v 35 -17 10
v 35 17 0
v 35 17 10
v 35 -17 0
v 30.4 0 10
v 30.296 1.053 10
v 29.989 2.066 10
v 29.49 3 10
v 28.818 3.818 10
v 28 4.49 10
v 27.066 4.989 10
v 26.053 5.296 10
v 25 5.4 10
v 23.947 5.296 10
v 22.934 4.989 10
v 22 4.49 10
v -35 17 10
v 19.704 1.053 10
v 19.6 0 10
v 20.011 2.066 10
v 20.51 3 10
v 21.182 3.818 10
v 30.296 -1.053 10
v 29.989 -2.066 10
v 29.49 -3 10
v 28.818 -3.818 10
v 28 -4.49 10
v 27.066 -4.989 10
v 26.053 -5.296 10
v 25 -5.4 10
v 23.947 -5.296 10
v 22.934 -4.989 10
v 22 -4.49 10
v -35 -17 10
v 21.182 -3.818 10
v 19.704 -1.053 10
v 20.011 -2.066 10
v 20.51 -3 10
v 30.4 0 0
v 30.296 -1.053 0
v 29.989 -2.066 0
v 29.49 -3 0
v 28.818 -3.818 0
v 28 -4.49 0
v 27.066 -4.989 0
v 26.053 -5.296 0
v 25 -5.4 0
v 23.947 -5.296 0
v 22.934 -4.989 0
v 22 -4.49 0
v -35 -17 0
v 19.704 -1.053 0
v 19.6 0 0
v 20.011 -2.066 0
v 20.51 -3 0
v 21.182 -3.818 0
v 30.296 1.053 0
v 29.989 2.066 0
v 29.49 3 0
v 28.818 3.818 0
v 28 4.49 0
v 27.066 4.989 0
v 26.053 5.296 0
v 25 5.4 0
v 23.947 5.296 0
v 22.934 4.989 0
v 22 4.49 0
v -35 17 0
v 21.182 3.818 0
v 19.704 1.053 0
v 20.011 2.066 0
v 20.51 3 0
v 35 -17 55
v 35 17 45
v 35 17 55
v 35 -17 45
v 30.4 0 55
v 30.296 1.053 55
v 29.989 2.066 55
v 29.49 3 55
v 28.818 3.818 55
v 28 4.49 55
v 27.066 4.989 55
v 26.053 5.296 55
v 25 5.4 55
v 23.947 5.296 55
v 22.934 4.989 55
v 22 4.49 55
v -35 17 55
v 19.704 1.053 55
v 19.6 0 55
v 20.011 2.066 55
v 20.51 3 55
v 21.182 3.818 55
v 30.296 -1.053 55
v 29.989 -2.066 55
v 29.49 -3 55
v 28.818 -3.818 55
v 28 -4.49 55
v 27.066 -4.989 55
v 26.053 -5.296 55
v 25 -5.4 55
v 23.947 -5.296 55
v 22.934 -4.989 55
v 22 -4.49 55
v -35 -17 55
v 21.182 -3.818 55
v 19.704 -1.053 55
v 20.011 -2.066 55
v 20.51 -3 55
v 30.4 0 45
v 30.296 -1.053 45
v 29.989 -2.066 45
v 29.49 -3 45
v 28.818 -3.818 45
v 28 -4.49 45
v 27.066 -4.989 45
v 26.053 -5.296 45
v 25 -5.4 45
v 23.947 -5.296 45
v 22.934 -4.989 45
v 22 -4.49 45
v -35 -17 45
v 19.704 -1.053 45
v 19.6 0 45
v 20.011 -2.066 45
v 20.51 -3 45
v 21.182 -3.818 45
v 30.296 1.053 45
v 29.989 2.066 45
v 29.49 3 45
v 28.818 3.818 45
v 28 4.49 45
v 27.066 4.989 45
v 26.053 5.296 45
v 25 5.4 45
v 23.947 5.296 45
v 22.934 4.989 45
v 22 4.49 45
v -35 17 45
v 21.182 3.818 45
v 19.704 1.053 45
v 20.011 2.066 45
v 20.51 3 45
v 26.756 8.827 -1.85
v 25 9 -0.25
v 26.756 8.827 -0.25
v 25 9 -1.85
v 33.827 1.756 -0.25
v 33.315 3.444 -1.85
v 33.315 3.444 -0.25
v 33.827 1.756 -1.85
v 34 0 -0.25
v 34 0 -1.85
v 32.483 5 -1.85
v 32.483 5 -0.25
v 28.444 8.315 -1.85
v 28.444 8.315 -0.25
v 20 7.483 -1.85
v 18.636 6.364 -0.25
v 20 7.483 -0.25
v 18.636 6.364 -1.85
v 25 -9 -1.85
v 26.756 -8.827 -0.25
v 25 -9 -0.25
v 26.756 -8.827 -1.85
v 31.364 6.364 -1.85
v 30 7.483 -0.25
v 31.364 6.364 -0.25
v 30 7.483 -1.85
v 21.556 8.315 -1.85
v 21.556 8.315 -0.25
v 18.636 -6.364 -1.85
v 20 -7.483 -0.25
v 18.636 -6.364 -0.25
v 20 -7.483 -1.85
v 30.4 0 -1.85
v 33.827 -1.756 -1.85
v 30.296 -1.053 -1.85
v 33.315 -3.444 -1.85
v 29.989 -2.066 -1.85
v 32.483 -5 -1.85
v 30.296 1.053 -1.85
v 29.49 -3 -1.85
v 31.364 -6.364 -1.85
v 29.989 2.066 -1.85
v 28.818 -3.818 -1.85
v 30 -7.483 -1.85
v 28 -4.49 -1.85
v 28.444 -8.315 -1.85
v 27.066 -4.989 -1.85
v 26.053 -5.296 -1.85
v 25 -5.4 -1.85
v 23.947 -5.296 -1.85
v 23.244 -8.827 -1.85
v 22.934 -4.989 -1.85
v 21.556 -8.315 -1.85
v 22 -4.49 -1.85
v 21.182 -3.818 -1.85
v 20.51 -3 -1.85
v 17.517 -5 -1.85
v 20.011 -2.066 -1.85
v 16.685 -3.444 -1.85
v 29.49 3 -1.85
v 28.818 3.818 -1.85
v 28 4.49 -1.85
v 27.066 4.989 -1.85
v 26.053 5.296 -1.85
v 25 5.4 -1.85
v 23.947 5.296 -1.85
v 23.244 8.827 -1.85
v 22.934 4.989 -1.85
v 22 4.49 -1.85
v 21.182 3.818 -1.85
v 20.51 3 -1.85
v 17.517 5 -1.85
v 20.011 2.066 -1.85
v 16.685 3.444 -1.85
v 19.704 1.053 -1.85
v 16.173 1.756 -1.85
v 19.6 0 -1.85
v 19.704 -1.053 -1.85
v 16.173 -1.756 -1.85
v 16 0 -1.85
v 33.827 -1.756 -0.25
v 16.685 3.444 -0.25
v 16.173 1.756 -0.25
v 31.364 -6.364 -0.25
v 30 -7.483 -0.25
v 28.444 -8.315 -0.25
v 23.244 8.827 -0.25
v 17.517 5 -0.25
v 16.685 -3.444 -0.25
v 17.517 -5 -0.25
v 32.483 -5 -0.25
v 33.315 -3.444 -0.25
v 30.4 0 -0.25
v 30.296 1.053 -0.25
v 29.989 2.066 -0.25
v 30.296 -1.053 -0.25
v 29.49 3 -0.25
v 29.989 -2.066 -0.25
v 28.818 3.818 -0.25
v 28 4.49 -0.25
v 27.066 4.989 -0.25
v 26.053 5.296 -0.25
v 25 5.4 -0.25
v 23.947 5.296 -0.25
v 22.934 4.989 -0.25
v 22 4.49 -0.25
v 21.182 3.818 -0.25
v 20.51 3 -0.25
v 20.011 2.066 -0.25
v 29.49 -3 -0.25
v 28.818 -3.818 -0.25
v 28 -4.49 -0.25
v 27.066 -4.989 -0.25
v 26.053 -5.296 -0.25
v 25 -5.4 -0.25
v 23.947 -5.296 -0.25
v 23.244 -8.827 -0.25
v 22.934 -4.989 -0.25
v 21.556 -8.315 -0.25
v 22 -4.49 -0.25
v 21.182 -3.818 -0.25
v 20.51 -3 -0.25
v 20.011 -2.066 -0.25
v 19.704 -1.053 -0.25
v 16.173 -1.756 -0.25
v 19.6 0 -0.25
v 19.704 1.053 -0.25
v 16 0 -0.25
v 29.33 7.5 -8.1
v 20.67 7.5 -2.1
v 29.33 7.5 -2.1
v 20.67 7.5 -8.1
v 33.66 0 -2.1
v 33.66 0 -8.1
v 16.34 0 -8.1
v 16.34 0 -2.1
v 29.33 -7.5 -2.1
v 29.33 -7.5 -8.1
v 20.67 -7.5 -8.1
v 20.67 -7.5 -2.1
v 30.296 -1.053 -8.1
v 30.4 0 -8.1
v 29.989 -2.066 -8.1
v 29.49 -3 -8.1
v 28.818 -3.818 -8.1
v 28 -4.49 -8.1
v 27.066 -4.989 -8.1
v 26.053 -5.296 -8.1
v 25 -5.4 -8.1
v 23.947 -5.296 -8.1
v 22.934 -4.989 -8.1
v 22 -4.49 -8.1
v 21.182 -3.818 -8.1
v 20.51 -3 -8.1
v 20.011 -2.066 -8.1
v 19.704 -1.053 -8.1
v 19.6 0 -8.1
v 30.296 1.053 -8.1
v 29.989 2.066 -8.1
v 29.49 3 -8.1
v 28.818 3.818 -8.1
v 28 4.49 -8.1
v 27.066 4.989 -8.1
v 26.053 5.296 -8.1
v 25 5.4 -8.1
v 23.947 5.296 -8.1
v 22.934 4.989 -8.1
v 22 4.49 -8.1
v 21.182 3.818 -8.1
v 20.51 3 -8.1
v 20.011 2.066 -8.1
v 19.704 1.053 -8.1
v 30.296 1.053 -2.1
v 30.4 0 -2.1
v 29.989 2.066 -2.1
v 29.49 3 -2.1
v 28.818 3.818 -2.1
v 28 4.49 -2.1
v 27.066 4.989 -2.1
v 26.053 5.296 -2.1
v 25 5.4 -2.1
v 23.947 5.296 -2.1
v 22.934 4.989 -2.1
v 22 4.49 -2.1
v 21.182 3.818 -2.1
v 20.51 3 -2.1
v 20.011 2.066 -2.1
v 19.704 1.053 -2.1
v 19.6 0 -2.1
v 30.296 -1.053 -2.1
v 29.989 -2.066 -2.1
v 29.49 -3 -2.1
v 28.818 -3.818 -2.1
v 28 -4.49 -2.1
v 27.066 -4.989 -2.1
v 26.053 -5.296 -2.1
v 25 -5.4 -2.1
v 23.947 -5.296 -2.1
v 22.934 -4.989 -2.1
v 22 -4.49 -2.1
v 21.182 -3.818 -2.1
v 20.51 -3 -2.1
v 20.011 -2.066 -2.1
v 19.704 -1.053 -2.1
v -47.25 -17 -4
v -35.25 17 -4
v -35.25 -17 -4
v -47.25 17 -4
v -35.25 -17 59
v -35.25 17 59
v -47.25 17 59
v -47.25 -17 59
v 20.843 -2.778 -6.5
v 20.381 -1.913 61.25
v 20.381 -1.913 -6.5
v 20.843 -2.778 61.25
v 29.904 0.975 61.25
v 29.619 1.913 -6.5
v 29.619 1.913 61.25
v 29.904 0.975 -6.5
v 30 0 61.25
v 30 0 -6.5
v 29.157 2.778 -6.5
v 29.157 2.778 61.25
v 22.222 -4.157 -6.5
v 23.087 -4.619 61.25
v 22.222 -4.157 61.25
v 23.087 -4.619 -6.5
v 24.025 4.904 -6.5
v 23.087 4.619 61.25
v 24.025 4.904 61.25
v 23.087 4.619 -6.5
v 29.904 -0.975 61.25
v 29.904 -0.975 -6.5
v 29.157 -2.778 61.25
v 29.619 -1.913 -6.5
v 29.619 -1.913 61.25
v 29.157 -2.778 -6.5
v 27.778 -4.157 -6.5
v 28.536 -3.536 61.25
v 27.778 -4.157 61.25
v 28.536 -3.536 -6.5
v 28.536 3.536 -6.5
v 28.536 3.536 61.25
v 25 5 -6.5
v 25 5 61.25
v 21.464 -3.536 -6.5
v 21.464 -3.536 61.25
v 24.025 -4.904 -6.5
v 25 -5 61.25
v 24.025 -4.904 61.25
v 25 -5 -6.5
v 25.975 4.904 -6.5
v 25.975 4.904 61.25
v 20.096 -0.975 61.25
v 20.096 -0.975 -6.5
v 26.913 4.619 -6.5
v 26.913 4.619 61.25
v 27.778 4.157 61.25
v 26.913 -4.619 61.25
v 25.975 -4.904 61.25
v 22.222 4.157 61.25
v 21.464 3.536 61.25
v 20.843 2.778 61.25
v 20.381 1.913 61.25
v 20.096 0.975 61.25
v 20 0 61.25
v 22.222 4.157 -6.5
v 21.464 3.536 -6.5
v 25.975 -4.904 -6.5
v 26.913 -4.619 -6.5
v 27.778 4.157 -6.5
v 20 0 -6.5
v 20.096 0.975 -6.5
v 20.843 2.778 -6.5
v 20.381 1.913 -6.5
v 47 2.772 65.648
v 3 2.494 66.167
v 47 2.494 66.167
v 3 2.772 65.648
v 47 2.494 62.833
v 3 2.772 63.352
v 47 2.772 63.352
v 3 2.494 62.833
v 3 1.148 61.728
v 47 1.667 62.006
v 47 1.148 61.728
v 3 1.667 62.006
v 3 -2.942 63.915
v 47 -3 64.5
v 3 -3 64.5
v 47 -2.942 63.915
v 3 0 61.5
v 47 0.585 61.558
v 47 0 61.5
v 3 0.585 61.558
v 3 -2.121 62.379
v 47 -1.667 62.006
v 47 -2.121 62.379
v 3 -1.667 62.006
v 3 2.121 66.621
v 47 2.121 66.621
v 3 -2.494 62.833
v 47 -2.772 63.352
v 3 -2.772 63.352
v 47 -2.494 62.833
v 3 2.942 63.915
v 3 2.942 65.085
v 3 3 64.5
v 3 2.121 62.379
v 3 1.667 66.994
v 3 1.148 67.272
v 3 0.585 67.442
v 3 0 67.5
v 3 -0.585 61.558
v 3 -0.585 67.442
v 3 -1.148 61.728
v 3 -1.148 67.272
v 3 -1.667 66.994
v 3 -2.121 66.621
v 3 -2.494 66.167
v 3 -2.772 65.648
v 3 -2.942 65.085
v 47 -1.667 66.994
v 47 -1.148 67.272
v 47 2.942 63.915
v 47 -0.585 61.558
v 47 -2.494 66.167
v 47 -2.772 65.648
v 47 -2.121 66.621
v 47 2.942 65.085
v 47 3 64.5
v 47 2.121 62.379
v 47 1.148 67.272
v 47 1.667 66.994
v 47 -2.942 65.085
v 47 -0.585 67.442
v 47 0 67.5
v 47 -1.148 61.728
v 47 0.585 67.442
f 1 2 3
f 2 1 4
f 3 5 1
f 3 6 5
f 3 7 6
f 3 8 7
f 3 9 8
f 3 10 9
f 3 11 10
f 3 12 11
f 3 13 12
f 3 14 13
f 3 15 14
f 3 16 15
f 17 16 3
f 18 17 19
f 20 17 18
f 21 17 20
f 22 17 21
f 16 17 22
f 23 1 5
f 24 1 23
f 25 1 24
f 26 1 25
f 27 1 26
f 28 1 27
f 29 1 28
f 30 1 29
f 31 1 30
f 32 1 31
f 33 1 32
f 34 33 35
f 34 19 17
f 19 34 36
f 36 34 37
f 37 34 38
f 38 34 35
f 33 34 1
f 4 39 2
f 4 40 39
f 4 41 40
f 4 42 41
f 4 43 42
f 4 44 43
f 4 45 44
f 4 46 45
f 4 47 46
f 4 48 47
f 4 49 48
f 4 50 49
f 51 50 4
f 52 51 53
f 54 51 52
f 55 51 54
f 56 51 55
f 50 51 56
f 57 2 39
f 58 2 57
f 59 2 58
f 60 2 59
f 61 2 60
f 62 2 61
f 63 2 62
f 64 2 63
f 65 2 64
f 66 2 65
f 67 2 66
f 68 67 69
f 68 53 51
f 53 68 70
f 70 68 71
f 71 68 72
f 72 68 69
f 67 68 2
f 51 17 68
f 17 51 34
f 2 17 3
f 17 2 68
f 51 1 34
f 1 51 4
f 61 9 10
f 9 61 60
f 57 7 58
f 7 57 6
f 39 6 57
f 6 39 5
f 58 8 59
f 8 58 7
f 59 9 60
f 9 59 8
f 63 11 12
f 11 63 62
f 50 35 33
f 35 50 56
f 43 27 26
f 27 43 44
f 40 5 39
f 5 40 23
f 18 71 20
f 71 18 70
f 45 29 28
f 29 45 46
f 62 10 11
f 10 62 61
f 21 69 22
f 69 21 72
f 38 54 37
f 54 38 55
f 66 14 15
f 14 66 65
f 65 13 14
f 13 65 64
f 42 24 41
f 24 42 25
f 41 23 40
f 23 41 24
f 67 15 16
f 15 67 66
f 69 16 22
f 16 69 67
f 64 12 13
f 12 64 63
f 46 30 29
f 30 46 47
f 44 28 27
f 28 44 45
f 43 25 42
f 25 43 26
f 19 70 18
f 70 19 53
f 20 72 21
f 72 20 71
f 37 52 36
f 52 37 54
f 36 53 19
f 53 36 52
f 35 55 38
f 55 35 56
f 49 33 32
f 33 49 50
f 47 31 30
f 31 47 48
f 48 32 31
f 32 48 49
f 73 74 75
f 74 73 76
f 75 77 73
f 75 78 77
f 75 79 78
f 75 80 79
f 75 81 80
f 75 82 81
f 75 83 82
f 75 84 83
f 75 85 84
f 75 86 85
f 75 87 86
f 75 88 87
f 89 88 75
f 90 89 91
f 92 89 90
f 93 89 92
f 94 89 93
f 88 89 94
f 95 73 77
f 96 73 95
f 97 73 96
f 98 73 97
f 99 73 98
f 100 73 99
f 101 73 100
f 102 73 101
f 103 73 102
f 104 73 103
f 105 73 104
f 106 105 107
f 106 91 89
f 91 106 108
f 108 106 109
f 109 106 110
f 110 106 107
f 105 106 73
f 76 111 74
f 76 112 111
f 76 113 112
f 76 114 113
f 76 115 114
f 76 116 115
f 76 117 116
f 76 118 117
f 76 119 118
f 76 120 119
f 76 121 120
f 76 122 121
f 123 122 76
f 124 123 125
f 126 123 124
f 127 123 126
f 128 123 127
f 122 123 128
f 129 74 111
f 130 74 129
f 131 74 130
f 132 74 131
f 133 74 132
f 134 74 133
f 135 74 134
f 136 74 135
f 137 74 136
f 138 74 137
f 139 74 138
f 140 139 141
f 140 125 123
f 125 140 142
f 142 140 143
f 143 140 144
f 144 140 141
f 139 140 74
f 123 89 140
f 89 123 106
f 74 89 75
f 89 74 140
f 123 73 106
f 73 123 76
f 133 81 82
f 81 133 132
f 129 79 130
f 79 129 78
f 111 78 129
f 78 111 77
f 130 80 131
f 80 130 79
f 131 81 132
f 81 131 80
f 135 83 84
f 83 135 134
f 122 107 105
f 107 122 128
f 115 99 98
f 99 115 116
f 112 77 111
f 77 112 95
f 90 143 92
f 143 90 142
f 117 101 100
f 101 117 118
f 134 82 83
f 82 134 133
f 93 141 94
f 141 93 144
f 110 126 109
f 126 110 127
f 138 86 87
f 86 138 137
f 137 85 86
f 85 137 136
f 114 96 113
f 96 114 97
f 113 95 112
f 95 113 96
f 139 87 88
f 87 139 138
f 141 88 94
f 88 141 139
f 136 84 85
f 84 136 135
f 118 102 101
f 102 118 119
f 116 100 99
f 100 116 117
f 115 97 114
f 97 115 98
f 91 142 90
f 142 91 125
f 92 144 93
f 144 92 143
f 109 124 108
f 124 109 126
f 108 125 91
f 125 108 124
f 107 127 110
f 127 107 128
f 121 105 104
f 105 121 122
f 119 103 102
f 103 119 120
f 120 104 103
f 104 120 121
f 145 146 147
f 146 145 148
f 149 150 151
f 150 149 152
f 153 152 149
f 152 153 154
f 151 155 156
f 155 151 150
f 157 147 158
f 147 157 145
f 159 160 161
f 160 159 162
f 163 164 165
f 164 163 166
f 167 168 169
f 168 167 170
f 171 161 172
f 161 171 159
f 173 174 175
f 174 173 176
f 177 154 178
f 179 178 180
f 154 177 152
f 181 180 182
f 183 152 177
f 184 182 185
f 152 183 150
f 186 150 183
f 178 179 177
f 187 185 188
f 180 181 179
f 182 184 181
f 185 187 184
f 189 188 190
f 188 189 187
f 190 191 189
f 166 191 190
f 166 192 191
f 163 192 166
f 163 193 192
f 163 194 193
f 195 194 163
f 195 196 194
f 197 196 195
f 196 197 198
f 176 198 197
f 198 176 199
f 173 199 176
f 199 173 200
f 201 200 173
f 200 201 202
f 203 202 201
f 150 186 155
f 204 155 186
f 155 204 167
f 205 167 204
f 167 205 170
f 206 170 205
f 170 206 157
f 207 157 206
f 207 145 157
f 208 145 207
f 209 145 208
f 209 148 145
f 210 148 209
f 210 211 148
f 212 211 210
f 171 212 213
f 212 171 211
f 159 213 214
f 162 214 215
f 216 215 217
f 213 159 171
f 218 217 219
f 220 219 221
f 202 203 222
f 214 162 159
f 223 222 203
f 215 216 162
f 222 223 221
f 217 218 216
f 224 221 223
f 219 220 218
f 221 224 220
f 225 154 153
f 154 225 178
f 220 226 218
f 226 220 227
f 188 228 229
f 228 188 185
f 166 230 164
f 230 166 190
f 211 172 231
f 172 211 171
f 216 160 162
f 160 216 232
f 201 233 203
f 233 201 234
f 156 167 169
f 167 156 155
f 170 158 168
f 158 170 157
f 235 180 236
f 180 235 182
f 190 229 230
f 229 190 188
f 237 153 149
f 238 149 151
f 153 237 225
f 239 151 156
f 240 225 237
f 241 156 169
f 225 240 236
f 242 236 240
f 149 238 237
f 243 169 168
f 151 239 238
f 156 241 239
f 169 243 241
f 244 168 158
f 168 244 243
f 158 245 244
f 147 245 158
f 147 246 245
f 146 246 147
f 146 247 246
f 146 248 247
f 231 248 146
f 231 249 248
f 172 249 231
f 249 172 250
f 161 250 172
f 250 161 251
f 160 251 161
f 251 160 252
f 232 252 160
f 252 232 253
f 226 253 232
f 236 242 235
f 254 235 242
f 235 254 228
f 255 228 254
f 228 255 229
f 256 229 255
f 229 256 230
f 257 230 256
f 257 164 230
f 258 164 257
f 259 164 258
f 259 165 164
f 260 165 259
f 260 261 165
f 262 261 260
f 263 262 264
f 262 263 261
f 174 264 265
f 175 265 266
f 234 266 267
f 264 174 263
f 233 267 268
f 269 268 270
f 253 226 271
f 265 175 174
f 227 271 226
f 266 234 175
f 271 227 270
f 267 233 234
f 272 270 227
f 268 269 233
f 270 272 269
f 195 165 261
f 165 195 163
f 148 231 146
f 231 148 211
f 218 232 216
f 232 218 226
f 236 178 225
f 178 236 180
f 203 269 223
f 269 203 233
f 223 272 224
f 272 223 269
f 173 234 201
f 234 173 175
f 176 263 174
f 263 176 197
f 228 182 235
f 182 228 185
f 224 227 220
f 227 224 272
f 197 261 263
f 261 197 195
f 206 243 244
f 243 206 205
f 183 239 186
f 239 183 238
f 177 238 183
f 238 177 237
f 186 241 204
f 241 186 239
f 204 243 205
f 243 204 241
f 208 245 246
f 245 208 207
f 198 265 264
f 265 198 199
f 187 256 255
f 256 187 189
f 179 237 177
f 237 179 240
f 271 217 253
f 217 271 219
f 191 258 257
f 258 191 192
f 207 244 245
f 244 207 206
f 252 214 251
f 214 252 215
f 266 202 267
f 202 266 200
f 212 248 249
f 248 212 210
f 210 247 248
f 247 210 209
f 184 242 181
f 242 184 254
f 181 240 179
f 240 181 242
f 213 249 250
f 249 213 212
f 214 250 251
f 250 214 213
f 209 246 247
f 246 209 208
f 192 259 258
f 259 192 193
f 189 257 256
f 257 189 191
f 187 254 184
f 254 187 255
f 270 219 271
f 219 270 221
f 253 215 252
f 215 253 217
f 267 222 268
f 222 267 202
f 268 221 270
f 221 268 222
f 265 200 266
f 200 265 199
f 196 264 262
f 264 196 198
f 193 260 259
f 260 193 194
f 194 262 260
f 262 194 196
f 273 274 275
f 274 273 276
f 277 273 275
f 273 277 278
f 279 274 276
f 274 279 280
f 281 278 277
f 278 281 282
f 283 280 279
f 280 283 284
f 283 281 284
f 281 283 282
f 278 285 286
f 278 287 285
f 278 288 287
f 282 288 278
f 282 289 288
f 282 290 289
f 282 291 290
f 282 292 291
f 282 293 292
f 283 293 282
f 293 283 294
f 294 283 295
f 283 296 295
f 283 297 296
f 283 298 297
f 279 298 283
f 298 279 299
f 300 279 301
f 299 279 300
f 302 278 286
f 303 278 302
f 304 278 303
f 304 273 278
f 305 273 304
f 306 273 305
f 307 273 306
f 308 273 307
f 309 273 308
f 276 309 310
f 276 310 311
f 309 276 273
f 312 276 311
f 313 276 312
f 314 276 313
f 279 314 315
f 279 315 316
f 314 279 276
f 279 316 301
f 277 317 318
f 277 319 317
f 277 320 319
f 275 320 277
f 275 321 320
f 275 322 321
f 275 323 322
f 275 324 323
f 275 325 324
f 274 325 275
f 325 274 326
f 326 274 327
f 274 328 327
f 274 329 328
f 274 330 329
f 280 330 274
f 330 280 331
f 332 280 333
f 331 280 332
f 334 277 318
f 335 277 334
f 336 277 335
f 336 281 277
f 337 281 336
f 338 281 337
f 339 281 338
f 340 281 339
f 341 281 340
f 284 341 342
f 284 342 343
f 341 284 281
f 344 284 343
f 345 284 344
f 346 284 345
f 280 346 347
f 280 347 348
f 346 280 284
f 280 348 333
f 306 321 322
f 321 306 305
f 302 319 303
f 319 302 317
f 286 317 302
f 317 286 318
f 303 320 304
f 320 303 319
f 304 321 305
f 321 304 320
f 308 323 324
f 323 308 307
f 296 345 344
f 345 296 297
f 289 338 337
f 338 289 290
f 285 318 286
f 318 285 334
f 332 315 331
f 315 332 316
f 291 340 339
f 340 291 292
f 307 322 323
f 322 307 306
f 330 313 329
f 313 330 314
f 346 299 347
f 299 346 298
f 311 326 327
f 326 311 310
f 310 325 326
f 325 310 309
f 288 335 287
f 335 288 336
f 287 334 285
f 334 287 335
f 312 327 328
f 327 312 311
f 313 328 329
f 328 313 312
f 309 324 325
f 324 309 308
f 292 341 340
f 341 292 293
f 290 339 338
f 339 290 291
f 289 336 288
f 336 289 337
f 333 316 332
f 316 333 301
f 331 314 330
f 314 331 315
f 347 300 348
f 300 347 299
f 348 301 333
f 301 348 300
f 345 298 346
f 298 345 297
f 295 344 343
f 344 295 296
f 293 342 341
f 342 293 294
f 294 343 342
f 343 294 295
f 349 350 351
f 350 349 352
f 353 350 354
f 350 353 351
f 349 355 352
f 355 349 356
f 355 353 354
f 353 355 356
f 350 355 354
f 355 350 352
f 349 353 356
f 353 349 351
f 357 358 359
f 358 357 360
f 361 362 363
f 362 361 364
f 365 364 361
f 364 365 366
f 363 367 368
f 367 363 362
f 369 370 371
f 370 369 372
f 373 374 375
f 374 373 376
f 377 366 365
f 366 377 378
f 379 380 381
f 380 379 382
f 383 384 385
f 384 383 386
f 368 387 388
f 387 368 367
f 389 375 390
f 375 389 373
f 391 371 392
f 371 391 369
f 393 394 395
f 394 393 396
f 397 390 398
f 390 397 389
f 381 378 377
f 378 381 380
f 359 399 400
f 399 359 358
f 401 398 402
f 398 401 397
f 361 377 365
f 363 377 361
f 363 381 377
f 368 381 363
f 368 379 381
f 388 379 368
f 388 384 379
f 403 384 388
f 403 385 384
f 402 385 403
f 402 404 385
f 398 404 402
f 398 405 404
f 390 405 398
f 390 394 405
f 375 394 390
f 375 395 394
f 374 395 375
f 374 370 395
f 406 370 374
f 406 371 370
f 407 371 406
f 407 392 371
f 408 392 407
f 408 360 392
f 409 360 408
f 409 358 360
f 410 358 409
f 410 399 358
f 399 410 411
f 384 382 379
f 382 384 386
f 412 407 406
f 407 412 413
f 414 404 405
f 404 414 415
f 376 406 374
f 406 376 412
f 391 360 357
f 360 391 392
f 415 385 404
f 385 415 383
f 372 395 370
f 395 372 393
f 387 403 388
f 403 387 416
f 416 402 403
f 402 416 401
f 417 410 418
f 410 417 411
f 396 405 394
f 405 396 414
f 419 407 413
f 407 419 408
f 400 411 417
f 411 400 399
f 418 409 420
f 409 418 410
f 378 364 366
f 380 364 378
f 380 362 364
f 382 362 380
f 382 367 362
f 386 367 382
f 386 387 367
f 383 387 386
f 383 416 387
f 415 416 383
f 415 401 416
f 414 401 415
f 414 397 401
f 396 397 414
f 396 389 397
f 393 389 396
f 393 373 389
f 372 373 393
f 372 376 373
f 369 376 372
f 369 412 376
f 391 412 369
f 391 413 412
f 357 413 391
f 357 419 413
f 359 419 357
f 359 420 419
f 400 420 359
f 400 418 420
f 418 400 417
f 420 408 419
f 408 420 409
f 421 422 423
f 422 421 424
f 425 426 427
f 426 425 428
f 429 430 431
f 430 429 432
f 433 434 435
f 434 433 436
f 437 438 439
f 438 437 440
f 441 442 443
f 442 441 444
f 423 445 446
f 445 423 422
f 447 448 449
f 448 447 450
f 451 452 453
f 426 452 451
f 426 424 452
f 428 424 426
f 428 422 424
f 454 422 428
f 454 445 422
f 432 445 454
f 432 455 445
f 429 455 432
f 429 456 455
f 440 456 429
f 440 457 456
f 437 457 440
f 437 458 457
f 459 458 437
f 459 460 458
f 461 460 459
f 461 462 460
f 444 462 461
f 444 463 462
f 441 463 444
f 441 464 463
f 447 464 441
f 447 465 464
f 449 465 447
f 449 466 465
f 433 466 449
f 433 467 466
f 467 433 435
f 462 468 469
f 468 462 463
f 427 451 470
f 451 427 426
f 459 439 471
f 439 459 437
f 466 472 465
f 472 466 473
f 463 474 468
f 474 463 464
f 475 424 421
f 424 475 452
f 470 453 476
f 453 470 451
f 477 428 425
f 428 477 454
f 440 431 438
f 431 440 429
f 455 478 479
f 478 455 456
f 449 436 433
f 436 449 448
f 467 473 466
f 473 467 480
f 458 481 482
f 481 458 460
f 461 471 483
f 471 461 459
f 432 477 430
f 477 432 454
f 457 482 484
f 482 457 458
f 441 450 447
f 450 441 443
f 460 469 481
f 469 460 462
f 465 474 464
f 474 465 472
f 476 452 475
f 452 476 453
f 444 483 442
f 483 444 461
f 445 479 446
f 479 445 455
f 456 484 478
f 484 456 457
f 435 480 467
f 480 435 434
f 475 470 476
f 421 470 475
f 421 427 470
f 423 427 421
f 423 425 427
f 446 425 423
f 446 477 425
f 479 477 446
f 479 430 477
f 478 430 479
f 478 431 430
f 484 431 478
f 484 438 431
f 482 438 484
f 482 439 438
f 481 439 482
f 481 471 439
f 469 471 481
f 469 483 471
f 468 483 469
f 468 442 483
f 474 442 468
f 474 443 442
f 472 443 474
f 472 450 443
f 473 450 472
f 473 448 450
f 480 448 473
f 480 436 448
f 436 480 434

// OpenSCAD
$fn = 32;

// ------------------------------------------------------------------------
// C clamp: throat 45 mm, screw d10
// Every part is its own module, assembly() places every instance.
// ------------------------------------------------------------------------

// --- part 1 ---
module clamp_arm() {
  difference() {
    translate([-35, -17, 0]) cube([70, 34, 10]);
    translate([25, 0, -1]) cylinder(h = 12, d = 10.8);
  }
}

// --- part 2 ---
module clamp_spine() {
  difference() {
    translate([-31.5, -17, 0]) cube([63, 34, 12]);
  }
}

// --- part 3 ---
module clamp_screw() {
  translate([0, 0, -33.875]) cylinder(h = 67.75, d = 10);
}

// --- part 4 ---
module clamp_washer() {
  difference() {
      translate([0, 0, 0]) cylinder(h = 1.6, d = 18);
      translate([0, 0, -1]) cylinder(h = 3.6, d = 10.8);
    }
}

// --- part 5 ---
module clamp_nut() {
  difference() {
    linear_extrude(height = 6) polygon(points = [[8.66, 0], [4.33, 7.5], [-4.33, 7.5], [-8.66, 0], [-4.33, -7.5], [4.33, -7.5]]);
    translate([0, 0, -1]) cylinder(h = 8, d = 10.8);
  }
}

// --- part 6 ---
module tommy_bar() {
  translate([0, 0, -22]) cylinder(h = 44, d = 6);
}

// --- assembly ---
module assembly() {
  color([0.80, 0.24, 0.20]) translate([0, 0, 0]) rotate([0, 0, 0]) clamp_arm();
  color([0.20, 0.45, 0.75]) translate([0, 0, 45]) rotate([0, 0, 0]) clamp_arm();
  color([0.25, 0.62, 0.32]) translate([-47.25, 0, 27.5]) rotate([0, 90, 0]) clamp_spine();
  color([0.92, 0.70, 0.18]) translate([25, 0, 27.375]) rotate([0, 0, 0]) clamp_screw();
  color([0.58, 0.35, 0.70]) translate([25, 0, -1.85]) rotate([0, 0, 0]) clamp_washer();
  color([0.16, 0.66, 0.66]) translate([25, 0, -8.1]) rotate([0, 0, 0]) clamp_nut();
  color([0.85, 0.48, 0.18]) translate([25, 0, 64.5]) rotate([0, 90, 0]) tommy_bar();
}

assembly();
